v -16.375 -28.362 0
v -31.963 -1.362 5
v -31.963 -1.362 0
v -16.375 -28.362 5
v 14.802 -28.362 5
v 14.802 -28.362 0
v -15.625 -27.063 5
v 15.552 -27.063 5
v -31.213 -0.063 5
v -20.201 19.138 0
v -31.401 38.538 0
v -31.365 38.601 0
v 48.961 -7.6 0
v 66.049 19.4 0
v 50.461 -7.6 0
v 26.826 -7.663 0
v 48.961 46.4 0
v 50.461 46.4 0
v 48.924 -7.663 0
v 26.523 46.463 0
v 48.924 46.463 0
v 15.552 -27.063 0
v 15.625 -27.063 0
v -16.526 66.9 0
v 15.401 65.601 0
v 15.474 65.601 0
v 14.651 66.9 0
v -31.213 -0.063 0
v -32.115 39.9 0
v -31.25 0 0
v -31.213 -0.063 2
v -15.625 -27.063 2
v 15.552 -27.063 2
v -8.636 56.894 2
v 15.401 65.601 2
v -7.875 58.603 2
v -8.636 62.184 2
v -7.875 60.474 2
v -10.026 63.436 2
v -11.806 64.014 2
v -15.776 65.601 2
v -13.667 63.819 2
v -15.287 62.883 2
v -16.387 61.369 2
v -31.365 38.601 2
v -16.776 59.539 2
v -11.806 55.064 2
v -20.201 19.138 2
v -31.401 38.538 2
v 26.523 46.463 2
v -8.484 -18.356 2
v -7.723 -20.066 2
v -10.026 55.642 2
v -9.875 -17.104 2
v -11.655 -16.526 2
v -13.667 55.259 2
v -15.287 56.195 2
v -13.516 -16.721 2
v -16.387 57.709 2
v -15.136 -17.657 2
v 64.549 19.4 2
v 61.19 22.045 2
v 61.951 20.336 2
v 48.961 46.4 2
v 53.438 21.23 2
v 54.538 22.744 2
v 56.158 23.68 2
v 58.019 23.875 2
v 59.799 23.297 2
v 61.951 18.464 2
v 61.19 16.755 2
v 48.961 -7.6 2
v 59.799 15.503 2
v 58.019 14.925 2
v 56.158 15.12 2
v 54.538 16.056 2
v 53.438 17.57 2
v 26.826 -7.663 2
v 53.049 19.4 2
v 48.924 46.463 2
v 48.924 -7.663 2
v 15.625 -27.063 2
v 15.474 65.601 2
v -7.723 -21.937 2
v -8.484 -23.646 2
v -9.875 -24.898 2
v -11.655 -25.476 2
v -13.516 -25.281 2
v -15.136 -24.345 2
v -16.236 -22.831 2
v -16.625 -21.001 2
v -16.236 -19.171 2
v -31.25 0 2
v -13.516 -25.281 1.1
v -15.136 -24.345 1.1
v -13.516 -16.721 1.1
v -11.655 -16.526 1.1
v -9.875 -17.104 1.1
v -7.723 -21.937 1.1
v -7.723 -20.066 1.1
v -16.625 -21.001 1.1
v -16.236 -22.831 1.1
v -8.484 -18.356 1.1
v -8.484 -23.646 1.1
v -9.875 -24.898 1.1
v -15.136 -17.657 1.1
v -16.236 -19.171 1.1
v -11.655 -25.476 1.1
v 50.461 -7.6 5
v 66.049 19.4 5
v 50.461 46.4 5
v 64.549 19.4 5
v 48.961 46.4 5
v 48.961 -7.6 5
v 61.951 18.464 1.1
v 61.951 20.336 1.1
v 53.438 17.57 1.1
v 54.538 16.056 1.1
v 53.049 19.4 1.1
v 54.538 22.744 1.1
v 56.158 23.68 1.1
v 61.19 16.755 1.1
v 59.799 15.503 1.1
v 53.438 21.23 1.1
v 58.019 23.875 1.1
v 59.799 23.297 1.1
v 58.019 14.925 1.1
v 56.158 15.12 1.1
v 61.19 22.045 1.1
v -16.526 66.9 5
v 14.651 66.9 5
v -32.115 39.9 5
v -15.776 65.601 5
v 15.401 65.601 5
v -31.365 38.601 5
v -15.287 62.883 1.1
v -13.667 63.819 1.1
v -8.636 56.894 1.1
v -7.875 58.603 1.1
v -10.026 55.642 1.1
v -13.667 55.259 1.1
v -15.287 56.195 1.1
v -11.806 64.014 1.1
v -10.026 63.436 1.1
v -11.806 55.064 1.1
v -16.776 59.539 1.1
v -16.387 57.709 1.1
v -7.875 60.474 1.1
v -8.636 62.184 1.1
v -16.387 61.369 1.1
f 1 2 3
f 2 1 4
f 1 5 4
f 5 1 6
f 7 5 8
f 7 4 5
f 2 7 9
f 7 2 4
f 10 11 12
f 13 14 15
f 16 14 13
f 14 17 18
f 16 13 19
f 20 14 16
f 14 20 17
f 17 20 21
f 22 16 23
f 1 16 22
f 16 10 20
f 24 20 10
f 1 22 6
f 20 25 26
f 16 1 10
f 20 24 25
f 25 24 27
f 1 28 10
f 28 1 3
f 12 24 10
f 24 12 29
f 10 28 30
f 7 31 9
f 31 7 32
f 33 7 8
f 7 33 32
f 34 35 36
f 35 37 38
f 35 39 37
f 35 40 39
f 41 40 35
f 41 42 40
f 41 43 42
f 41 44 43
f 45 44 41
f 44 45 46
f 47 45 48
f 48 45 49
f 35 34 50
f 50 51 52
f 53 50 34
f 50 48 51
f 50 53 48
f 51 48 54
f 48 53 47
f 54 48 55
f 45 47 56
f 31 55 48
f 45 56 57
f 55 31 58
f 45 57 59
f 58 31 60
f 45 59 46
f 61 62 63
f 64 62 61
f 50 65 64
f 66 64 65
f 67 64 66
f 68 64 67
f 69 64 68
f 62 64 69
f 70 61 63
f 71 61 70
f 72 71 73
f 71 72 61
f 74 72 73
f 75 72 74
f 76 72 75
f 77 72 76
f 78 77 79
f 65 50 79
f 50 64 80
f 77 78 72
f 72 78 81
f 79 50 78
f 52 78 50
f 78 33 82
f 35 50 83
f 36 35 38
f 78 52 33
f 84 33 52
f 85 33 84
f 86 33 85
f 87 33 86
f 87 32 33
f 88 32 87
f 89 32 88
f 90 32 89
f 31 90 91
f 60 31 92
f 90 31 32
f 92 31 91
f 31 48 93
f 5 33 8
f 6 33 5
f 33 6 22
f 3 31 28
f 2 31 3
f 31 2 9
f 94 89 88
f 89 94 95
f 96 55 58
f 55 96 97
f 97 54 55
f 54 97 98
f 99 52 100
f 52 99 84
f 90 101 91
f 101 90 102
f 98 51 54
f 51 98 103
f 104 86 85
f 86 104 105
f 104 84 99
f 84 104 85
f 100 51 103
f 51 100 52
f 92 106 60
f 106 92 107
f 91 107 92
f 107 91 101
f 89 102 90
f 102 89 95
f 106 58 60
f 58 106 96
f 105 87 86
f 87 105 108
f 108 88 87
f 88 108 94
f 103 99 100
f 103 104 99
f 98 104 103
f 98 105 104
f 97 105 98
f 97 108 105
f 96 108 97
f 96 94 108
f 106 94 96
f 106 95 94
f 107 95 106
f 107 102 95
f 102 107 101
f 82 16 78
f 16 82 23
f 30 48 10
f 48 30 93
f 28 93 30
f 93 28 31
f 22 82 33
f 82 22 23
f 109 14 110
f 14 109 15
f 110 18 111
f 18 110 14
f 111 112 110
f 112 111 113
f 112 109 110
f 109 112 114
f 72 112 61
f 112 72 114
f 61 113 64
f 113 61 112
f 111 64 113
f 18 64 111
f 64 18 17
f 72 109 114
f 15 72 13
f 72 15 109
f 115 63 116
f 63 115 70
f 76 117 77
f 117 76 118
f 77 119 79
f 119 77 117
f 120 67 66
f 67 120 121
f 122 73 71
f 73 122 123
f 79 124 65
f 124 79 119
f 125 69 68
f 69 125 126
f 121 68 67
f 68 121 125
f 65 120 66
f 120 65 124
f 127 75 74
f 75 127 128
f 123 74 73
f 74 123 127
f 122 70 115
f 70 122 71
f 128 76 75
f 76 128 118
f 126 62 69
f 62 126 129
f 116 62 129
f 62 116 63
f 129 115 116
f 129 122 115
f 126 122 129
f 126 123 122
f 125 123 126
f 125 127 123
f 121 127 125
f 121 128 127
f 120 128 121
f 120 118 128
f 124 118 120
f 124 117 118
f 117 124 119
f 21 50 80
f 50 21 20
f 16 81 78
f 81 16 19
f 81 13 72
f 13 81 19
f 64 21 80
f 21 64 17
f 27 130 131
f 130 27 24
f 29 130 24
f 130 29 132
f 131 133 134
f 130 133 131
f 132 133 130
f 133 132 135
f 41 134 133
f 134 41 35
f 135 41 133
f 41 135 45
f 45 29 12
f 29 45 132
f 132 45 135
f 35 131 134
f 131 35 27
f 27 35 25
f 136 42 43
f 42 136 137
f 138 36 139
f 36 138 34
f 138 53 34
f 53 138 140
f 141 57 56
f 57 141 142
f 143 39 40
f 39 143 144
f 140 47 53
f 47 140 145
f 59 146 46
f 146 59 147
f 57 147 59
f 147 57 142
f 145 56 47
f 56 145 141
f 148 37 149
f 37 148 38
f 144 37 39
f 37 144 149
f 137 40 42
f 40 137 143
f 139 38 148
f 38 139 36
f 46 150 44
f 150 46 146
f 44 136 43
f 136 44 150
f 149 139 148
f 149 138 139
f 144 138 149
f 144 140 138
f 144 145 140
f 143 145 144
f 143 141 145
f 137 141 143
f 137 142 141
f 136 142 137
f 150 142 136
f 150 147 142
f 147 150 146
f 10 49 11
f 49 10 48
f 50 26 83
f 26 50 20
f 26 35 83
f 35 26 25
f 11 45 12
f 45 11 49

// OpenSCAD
magnetDiameter = 9;
magnetHeight = .9;

hexDiameter = 44.5 + 17 + 1;
outerHexDiameterPadding = 3;
hexPileHeight = 3;
floorThickness = 2;
rimHeight = 3;

Hex();
translate([33.299,19.4,0])
    rotate([0,0,120])
        Hex();
rotate([0,0,240])
    translate([-33.299,-19.4,0])
        Hex();
        
module Hex()
{
    rotate([0,0,60])
    {
        union()
        {
            difference()
            {
                
                cylinder(h=hexPileHeight + floorThickness, d=hexDiameter + outerHexDiameterPadding, $fn=6);
                translate([0, 0, floorThickness])
                    cylinder(h=hexPileHeight, d=hexDiameter, $fn=6);
                translate([-11,-30, 0])
                    cube([hexDiameter + outerHexDiameterPadding, hexDiameter + outerHexDiameterPadding, hexPileHeight + floorThickness]);
                translate([-20, -29, 0])
                    cube([10, 2, hexPileHeight + floorThickness]);
                      translate([-20, 27, 0])
                    cube([10, 10, hexPileHeight + floorThickness]);
                  translate([-(hexDiameter + outerHexDiameterPadding)/2 + 8.5,0, floorThickness - magnetHeight])
                    cylinder(h=magnetHeight, d=magnetDiameter);
            }
      
            difference()
            {
                translate([0, 0, 0])
                    cylinder(h=floorThickness, d=hexDiameter, $fn=6);
                translate([-(hexDiameter + outerHexDiameterPadding)/2 + 8.5,0, floorThickness - magnetHeight])
                    cylinder(h=magnetHeight, d=magnetDiameter);
            }
          
        }
        
    }
}
